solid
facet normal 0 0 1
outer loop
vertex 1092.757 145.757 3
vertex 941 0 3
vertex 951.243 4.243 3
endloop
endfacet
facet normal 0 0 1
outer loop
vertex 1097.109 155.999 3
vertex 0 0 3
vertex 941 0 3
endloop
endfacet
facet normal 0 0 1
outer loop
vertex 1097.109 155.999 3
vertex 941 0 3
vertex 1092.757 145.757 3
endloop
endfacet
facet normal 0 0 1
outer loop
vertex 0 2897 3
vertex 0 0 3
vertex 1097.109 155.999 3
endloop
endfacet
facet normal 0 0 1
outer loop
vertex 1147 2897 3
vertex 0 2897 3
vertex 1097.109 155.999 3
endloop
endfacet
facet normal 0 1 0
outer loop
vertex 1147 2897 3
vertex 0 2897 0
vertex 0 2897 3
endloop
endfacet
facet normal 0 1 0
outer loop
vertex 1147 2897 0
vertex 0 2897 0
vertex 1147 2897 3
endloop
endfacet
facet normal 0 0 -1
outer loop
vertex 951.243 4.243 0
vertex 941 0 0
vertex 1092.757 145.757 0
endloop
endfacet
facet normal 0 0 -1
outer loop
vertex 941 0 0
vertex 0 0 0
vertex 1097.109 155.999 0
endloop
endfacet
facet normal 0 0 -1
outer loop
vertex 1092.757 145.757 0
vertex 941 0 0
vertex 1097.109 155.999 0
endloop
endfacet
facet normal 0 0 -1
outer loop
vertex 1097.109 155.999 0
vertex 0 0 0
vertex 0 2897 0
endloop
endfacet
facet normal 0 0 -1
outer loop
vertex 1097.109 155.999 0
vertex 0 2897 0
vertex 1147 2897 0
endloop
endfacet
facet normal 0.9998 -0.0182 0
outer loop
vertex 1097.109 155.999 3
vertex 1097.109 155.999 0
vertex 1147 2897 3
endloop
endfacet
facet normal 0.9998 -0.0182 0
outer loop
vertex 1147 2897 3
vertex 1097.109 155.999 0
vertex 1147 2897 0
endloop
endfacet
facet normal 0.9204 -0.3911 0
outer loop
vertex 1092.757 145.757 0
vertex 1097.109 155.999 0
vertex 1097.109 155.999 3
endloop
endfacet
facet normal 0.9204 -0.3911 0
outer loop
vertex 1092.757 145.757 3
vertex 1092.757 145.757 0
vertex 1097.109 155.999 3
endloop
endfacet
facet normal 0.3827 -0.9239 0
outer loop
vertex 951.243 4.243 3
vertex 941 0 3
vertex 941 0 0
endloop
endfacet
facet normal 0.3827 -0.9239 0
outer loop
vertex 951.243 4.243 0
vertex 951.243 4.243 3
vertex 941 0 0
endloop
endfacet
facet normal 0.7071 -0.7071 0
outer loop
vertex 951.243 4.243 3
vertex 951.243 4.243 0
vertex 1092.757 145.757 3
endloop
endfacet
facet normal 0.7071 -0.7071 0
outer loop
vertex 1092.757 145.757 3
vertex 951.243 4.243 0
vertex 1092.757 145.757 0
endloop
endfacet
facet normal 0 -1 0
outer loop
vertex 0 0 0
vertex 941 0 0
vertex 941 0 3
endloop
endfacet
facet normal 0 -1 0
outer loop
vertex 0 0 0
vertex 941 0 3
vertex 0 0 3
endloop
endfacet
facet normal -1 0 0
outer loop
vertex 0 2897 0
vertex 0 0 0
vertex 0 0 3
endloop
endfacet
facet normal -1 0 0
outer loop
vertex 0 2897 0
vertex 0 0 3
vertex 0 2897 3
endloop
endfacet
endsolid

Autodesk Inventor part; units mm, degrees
ref_plane "YZ Plane" through (0, 0, 0) normal (1, 0, 0) x (0, 1, 0)
ref_plane "XZ Plane" through (0, 0, 0) normal (0, 1, 0) x (-1, 0, 0)
ref_plane "XY Plane" through (0, 0, 0) normal (0, 0, 1) x (1, 0, 0)
sketch "Sketch5" plane through (0, 0, 0) normal (0, 0, 1) x (1, 0, 0)
  line L0 (0, 2897) -> (1200, 2897)
  line L1 (1200, 2897) -> (1200, 0)
  line L2 (1200, 0) -> (0, 0)
  line L3 (0, 0) -> (0, 2897)
  line L4 (0, 2897) -> (1200, 0) construction
  line L5 (1200, 2897) -> (0, 0) construction
  line L6 (947, 0) -> (1097, 150)
  line L7 (1097, 150) -> (1147, 2897)
  point P0 (600, 1448.5)
  dimension "d26" = 1200
  dimension "d27" = 2897
  dimension "d29" = 53
  dimension "d30" = 947
  dimension "d31" = 150
  dimension "d32" = 103
extrude "Plate4" add sketch "Sketch5" along normal blind 3 contours L0 L7 L6 L2 L3
chamfer "Corner Chamfer1" distance 6 angle 45 2 edges at (947, 0, 1.5) (1097, 150, 1.5)
equation "\"d28\" = Thickness"
equation "\"BendReliefWidth\" = Thickness"
equation "\"BendReliefDepth\" = 0.5 * Thickness"
equation "\"CornerReliefSize\" = 4 * Thickness"
equation "\"MinimumRemnant\" = 2 * Thickness"
equation "\"TransitionRadius\" = BendRadius"
equation "\"JacobiRadiusSize\" = BendRadius"
equation "\"GapSize\" = Thickness"
equation "\"Thickness\" = 3"
equation "\"BendRadius\" = 5"
properties part number "BSH 061 butt end" material "09g2s"
